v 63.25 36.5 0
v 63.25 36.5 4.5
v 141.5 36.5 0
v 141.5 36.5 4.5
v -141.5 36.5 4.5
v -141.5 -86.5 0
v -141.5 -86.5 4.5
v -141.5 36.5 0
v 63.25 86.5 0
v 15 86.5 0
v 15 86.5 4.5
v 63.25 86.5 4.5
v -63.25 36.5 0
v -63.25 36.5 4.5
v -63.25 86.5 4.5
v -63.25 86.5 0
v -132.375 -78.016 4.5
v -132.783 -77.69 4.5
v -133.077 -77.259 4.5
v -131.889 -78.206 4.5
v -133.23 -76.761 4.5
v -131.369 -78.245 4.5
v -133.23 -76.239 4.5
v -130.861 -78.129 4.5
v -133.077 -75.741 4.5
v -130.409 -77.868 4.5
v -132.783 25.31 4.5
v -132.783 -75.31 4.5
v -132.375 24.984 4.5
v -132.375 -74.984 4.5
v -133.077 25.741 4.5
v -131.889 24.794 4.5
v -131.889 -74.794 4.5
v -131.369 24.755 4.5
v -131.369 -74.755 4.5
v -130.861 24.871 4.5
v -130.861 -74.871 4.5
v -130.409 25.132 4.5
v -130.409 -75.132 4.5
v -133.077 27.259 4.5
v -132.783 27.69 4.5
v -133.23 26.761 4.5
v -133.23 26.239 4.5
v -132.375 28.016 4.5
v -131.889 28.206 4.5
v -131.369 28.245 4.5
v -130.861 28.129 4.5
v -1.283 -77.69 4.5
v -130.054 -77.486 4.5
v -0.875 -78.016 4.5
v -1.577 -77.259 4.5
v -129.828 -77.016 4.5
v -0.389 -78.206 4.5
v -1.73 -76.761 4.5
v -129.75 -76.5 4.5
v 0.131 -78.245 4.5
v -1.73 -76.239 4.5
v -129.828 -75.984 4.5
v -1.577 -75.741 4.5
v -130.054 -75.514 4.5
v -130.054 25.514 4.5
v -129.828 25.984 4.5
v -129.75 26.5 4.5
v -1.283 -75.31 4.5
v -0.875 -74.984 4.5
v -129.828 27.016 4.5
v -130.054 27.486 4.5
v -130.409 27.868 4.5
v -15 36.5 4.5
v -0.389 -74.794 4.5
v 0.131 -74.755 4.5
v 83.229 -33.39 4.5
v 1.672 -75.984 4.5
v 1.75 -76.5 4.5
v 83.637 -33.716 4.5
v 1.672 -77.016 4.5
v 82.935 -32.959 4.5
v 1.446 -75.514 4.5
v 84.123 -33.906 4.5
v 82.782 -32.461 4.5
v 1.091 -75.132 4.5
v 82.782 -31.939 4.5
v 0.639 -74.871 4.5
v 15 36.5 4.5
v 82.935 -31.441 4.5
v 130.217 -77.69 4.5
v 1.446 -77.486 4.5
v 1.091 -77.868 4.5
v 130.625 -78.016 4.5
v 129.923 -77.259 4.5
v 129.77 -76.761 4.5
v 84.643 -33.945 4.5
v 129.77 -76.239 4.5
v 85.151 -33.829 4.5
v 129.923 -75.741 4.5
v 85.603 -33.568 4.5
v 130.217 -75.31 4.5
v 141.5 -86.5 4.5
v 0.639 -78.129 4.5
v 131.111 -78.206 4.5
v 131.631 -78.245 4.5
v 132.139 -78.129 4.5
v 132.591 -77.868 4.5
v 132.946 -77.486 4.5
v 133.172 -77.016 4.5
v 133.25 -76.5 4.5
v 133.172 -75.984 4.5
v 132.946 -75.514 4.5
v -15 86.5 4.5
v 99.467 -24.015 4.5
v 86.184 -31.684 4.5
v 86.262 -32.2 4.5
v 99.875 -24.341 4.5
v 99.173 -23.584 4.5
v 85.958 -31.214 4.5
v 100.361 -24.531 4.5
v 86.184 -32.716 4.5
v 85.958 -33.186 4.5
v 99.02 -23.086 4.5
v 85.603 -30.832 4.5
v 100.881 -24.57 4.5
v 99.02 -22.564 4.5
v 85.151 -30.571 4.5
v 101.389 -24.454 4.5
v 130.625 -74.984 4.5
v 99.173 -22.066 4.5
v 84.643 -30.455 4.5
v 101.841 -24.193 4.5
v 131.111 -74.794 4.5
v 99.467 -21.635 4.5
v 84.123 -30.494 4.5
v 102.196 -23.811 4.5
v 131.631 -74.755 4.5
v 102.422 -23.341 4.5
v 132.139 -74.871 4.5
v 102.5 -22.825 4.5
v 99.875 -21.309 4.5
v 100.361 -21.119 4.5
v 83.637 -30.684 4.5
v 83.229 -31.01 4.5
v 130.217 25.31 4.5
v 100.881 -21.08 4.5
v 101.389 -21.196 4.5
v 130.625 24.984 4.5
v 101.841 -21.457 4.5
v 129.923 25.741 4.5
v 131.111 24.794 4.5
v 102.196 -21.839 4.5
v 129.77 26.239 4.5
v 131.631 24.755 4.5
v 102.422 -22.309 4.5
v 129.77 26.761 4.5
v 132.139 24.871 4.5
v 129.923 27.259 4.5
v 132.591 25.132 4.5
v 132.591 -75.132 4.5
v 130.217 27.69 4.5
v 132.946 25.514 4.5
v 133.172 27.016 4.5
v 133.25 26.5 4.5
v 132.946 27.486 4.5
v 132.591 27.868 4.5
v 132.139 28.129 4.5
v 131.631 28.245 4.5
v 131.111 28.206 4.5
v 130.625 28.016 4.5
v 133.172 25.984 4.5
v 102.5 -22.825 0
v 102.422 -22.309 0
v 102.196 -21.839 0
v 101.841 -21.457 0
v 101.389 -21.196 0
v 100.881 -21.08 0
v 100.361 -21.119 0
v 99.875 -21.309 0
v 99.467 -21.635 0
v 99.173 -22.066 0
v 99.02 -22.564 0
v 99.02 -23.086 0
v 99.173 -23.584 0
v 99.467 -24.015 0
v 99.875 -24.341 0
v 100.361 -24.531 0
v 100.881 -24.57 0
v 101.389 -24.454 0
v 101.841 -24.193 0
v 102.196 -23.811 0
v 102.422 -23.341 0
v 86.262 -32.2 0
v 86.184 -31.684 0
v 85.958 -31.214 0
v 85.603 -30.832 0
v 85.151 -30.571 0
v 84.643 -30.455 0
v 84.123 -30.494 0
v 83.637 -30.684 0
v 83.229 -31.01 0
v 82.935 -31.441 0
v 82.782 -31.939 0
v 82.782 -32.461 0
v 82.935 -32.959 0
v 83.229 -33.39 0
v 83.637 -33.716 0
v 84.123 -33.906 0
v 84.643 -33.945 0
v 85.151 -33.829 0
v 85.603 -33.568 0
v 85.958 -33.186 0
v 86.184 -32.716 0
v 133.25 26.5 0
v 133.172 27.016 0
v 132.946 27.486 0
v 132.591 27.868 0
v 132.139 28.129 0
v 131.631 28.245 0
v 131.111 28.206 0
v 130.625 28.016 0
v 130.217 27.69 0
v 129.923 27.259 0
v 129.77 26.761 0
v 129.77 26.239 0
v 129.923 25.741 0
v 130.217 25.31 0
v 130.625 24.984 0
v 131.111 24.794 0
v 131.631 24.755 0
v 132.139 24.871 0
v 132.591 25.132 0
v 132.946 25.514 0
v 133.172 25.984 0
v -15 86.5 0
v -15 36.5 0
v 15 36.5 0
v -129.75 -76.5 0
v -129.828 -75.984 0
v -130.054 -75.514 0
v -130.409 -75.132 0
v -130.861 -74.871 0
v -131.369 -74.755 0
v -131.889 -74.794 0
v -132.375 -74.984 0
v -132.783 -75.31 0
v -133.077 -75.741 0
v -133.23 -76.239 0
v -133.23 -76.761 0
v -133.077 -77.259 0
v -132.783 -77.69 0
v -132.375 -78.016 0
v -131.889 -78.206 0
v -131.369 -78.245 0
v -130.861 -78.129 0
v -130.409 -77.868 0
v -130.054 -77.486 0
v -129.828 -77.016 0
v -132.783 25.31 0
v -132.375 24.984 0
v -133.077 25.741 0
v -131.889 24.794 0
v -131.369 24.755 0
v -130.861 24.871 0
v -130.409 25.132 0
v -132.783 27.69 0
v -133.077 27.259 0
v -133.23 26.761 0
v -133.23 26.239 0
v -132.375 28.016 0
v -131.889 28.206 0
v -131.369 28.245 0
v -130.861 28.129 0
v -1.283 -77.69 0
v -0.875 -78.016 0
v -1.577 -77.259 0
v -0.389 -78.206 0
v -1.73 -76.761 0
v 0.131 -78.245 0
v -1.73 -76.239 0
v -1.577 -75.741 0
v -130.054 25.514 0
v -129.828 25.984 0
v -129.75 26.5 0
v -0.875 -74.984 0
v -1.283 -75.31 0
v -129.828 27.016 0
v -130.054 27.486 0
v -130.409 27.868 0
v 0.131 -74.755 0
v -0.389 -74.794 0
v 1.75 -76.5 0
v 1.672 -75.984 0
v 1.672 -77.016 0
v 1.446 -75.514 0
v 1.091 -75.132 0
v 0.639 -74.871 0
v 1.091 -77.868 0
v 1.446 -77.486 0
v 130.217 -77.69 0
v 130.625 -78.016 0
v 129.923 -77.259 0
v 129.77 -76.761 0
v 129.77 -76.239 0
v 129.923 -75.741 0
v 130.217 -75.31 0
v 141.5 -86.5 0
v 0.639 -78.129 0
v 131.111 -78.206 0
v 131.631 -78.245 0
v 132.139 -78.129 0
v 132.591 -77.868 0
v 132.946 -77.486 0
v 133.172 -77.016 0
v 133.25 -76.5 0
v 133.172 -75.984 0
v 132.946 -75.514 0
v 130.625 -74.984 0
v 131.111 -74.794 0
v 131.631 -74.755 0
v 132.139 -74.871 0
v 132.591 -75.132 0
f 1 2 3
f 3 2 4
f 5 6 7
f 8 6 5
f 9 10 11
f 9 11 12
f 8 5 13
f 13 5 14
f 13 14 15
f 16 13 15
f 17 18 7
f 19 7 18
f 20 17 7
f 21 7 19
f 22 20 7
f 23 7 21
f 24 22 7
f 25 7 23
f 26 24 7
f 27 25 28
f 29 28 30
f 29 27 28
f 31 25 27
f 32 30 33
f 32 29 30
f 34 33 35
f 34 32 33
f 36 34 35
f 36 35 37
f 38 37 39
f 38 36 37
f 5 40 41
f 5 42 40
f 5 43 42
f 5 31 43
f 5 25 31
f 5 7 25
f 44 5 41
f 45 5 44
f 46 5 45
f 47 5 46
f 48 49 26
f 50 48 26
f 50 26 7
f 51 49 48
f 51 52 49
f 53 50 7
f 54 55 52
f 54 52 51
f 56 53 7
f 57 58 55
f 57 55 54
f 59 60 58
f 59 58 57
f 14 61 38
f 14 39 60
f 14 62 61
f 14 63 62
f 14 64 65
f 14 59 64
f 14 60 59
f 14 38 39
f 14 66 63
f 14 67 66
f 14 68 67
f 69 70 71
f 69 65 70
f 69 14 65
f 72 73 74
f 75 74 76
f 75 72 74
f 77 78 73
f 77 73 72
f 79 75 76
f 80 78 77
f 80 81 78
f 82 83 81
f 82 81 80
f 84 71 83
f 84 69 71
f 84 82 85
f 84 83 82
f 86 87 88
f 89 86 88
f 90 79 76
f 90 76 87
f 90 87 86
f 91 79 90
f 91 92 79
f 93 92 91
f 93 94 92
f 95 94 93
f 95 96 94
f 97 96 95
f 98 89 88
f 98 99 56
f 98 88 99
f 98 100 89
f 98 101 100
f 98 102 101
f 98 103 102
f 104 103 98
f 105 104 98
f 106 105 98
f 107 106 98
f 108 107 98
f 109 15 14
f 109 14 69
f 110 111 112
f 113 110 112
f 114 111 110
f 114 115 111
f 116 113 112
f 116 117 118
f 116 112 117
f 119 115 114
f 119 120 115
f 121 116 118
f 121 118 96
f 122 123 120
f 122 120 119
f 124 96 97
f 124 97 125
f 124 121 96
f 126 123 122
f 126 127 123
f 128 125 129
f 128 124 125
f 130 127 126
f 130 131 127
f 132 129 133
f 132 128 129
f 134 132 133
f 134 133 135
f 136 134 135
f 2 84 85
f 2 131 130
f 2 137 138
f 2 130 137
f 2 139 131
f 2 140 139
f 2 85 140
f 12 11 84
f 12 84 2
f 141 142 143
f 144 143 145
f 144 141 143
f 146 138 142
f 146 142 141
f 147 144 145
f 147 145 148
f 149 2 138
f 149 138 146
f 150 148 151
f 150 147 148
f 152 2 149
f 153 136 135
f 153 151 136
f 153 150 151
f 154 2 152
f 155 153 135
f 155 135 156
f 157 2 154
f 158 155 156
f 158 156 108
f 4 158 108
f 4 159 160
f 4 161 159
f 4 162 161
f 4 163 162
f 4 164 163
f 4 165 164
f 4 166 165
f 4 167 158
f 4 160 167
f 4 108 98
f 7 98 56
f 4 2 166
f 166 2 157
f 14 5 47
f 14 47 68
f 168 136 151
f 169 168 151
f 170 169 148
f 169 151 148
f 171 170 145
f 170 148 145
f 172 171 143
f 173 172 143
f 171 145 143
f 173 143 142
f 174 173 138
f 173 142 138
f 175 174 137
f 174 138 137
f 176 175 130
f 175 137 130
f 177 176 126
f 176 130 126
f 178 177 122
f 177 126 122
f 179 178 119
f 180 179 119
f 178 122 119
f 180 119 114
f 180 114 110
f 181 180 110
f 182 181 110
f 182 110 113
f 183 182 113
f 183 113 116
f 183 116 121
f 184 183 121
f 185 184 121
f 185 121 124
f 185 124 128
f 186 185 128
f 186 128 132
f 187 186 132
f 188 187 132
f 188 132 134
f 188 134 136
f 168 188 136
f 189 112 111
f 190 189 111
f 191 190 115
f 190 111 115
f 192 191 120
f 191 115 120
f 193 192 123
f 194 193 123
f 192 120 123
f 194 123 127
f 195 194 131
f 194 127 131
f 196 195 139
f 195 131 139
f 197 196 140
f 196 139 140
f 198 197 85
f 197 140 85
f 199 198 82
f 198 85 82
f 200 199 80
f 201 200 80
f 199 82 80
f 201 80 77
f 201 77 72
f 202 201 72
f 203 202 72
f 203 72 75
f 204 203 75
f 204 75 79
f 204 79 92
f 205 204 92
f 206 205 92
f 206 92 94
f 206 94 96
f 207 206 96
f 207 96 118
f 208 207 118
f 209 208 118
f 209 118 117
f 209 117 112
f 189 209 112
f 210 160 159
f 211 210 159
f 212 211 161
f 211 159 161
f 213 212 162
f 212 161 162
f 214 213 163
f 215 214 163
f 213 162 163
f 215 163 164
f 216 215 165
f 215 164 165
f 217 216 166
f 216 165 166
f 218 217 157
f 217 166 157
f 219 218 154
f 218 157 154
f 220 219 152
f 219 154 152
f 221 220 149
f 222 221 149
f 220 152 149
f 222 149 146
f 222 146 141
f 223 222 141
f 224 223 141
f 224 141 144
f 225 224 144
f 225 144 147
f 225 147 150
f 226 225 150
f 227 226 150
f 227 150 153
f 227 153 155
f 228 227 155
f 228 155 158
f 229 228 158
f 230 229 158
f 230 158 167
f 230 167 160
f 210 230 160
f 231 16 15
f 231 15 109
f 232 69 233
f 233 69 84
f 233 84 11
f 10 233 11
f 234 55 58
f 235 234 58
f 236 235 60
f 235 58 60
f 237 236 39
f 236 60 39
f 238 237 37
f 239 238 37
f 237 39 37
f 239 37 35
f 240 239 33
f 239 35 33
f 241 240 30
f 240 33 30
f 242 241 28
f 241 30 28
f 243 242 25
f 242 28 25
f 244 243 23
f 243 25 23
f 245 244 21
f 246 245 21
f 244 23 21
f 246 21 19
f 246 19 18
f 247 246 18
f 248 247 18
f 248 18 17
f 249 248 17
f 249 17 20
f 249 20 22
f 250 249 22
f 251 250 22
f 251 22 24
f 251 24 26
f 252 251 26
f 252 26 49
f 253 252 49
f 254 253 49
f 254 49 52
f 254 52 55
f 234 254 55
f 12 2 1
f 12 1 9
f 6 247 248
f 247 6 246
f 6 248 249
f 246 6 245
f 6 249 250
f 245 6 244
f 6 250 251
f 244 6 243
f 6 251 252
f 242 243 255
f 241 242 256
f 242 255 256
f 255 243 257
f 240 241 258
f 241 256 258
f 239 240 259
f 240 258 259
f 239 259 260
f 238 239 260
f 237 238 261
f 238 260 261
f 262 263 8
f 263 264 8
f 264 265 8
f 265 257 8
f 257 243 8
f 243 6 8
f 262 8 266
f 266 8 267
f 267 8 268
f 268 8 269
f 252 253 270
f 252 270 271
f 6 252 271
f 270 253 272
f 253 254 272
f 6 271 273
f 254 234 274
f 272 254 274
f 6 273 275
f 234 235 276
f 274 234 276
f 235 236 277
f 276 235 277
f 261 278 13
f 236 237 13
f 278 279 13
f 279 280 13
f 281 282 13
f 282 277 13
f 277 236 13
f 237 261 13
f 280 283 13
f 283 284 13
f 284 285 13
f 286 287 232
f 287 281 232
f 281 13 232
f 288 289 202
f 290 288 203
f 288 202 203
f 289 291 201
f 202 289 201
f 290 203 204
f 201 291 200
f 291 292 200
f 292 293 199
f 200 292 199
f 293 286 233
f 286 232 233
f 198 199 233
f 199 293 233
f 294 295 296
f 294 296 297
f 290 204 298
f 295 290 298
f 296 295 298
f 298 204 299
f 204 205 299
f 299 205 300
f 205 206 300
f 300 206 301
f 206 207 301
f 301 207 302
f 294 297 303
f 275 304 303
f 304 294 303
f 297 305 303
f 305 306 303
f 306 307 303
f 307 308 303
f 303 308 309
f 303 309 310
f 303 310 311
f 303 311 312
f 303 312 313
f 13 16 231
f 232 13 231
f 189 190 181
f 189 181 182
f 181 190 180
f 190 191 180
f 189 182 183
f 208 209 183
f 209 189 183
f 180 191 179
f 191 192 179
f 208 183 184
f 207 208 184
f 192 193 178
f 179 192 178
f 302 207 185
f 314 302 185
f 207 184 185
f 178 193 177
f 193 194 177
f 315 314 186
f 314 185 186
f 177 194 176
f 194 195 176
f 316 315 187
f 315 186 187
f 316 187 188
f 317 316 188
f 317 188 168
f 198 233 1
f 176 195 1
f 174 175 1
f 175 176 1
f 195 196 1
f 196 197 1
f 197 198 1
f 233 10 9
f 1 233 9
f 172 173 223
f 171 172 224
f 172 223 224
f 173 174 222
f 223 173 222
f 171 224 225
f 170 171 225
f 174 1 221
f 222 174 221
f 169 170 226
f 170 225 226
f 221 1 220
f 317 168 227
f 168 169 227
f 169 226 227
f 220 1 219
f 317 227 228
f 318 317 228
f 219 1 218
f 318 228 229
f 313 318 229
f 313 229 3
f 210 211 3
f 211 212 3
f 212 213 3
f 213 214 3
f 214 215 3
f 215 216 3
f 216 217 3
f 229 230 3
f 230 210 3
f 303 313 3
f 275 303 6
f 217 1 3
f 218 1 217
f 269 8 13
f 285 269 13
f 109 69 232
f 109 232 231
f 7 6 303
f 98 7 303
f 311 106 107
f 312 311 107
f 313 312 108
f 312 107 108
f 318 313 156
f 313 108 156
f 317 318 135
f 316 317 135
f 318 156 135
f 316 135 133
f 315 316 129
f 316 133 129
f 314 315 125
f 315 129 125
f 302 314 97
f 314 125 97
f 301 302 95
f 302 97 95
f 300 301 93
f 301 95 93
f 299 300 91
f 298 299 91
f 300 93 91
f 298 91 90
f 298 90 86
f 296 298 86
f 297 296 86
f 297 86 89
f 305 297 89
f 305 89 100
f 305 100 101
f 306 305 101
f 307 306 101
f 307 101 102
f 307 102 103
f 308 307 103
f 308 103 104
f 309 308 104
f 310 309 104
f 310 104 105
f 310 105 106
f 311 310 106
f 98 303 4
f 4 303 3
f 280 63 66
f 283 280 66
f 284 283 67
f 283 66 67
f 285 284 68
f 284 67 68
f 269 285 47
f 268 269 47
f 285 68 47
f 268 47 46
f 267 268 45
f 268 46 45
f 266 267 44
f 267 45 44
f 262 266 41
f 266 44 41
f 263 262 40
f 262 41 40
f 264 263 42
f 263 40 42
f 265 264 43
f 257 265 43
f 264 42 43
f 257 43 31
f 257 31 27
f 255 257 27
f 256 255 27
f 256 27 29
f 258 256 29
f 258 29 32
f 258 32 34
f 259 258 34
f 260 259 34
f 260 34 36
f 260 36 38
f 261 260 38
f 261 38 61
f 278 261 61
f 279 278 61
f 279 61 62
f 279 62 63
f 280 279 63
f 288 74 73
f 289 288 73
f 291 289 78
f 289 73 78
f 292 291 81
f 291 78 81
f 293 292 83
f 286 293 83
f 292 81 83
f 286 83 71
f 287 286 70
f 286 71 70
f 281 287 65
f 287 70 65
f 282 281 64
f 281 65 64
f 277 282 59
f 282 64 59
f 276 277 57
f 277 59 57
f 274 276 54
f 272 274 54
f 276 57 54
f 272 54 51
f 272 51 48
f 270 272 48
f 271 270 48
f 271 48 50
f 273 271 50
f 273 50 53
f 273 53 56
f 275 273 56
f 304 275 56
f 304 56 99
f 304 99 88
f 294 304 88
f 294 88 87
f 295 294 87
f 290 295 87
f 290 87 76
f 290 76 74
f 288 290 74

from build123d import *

# Parameters (mm, degrees)
SKETCH1_W           = 283
SKETCH1_H           = 173
SKETCH1_R           = 1.75
BOSS_EXTRUDE1_DEPTH = 4.5
CUT_EXTRUDE1_REACH  = 6.5
SKETCH2_W           = 78.25
SKETCH2_H           = 50
SKETCH2_W_2         = 30
SKETCH3_R           = 1.75
CUT_EXTRUDE2_DEPTH  = 10
CUT_EXTRUDE4_REACH  = 6.5
SKETCH5_R           = 1.75


with BuildPart() as part:
    # Sketch1 → Boss-Extrude1 (new body)
    with BuildSketch(Plane.XY):
        Rectangle(SKETCH1_W, SKETCH1_H)
        with Locations((-131.5, 76.5)):
            Circle(SKETCH1_R, mode=Mode.SUBTRACT)
        with Locations((-131.5, 76.5)):
            Circle(SKETCH1_R)
    extrude(amount=BOSS_EXTRUDE1_DEPTH)

    # Sketch2 → Cut-Extrude1 (cut, up to next)
    with BuildSketch(Plane.XY.offset(4.5), mode=Mode.PRIVATE) as cut_extrude1_sk1:
        with Locations((102.375, 61.5)):
            Rectangle(SKETCH2_W, SKETCH2_H)
    cut_extrude1_tool1 = extrude(cut_extrude1_sk1.sketch, amount=-CUT_EXTRUDE1_REACH, mode=Mode.PRIVATE) & part.part
    add(cut_extrude1_tool1.solids().sort_by_distance((102.375, 61.5, 4.5))[0], mode=Mode.SUBTRACT)
    # Sketch2 → Cut-Extrude1 (cut, up to next)
    with BuildSketch(Plane.XY.offset(4.5), mode=Mode.PRIVATE) as cut_extrude1_sk2:
        with Locations((-102.375, 61.5)):
            Rectangle(SKETCH2_W, SKETCH2_H)
    cut_extrude1_tool2 = extrude(cut_extrude1_sk2.sketch, amount=-CUT_EXTRUDE1_REACH, mode=Mode.PRIVATE) & part.part
    add(cut_extrude1_tool2.solids().sort_by_distance((-102.375, 61.5, 4.5))[0], mode=Mode.SUBTRACT)
    # Sketch2 → Cut-Extrude1 (cut, up to next)
    with BuildSketch(Plane.XY.offset(4.5), mode=Mode.PRIVATE) as cut_extrude1_sk3:
        with Locations((0, 61.5)):
            Rectangle(SKETCH2_W_2, SKETCH2_H)
    cut_extrude1_tool3 = extrude(cut_extrude1_sk3.sketch, amount=-CUT_EXTRUDE1_REACH, mode=Mode.PRIVATE) & part.part
    add(cut_extrude1_tool3.solids().sort_by_distance((0, 61.5, 4.5))[0], mode=Mode.SUBTRACT)

    # Sketch3 → Cut-Extrude2 (cut)
    with BuildSketch(Plane.XY.offset(4.5)):
        with Locations((-131.5, -76.5)):
            Circle(SKETCH3_R)
        with Locations((131.5, -76.5)):
            Circle(SKETCH3_R)
        with Locations((131.5, 26.5)):
            Circle(SKETCH3_R)
        with Locations((-131.5, 26.5)):
            Circle(SKETCH3_R)
        with Locations((0, -76.5)):
            Circle(SKETCH3_R)
    extrude(amount=-CUT_EXTRUDE2_DEPTH, mode=Mode.SUBTRACT)

    # Sketch5 → Cut-Extrude4 (cut, up to next)
    with BuildSketch(Plane.XY.offset(4.5), mode=Mode.PRIVATE) as cut_extrude4_sk1:
        with Locations((84.512023679, -32.2)):
            Circle(SKETCH5_R)
    cut_extrude4_tool1 = extrude(cut_extrude4_sk1.sketch, amount=-CUT_EXTRUDE4_REACH, mode=Mode.PRIVATE) & part.part
    add(cut_extrude4_tool1.solids().sort_by_distance((84.512024, -32.2, 4.5))[0], mode=Mode.SUBTRACT)
    # Sketch5 → Cut-Extrude4 (cut, up to next)
    with BuildSketch(Plane.XY.offset(4.5), mode=Mode.PRIVATE) as cut_extrude4_sk2:
        with Locations((100.75, -22.825)):
            Circle(SKETCH5_R)
    cut_extrude4_tool2 = extrude(cut_extrude4_sk2.sketch, amount=-CUT_EXTRUDE4_REACH, mode=Mode.PRIVATE) & part.part
    add(cut_extrude4_tool2.solids().sort_by_distance((100.75, -22.825, 4.5))[0], mode=Mode.SUBTRACT)


solid = part.part
